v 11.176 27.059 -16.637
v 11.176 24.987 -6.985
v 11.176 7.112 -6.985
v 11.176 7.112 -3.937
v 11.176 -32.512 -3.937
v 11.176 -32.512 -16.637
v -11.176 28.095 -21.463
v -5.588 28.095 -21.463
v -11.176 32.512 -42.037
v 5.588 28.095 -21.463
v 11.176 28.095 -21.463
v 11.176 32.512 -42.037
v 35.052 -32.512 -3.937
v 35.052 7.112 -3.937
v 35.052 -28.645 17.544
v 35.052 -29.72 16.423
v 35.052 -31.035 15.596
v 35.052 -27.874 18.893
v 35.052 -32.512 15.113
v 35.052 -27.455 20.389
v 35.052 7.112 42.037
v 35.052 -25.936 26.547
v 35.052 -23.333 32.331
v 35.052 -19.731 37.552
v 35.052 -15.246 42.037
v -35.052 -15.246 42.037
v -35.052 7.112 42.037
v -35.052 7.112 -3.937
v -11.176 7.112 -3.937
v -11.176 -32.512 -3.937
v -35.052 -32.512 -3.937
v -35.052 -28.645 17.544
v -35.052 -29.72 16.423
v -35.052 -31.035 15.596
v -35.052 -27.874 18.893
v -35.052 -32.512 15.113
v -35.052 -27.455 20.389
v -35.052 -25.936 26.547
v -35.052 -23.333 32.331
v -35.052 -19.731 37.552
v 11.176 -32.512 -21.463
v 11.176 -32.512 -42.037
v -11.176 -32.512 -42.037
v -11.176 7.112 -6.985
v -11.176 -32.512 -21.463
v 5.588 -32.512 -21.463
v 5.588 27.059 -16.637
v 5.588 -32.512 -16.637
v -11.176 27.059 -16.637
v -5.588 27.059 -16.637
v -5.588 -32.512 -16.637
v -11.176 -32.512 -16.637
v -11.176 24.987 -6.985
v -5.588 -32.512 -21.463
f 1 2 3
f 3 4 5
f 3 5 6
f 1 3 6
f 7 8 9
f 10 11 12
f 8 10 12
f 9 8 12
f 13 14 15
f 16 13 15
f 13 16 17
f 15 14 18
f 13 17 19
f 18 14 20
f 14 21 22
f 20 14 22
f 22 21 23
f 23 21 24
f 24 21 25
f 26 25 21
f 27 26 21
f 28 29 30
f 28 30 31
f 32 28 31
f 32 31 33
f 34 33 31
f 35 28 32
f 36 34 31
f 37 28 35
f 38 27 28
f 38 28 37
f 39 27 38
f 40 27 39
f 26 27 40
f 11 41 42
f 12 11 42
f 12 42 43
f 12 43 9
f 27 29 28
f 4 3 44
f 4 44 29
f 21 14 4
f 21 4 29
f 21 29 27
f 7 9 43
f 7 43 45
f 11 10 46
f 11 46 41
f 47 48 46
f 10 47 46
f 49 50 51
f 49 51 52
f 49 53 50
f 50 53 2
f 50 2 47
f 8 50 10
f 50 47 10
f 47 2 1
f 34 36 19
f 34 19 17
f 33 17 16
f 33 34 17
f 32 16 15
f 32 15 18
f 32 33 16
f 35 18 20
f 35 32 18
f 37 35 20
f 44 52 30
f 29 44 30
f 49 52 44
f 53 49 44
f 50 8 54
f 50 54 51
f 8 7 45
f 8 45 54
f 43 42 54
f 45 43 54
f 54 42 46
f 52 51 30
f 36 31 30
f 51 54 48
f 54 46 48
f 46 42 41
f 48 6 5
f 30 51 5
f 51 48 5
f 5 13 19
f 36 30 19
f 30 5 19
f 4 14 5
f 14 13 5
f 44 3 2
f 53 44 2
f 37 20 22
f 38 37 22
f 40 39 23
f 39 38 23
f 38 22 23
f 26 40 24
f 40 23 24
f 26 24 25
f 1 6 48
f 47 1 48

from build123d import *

# Parameters (mm, degrees)
F0_W          = 65.024
F0_H          = 84.074
F1_DEPTH      = 35.052
F1_DEPTH_BACK = 35.052
F3_DEPTH      = 63.5
F4_W          = 77.3881527235
F4_H          = 70.5238262352
F5_DEPTH      = 38.1
F7_DEPTH      = 25.4
F9_DEPTH      = 38.1
F10_T1_DEPTH  = 70.104


# Not quite as in the source:
# - a fillet or chamfer that OpenCascade refuses, or shapes differently, is made with other operations: its cross-section is extruded or revolved along the edge and cut away or added


with BuildPart() as f1:
    # F0 (on Right) → F1 (new body, two sides)
    with BuildSketch(Plane.YZ) as f1_sk:
        Rectangle(F0_W, F0_H)
    extrude(amount=F1_DEPTH)
    extrude(f1_sk.sketch, amount=-F1_DEPTH_BACK)

    # F2 (on Front) → F3 (cut, symmetric)
    with BuildSketch(Plane.XZ):
        Polygon((-11.176, -16.637), (-11.176, -3.937), (-78.232, -3.937), (-78.232, -87.8102174824), (-11.176, -87.8102174824), (-11.176, -21.463), (-5.588, -21.463), (-5.588, -16.637), align=None)
        Polygon((75.6774835046, -3.937), (11.176, -3.937), (11.176, -16.637), (5.588, -16.637), (5.588, -21.463), (11.176, -21.463), (11.176, -87.8102174824), (75.6774835046, -87.8102174824), align=None)
    extrude(amount=F3_DEPTH, both=True, mode=Mode.SUBTRACT)

    # F4 (on Right) → F5 (cut, symmetric)
    with BuildSketch(Plane.YZ):
        with Locations((45.8060763618, 28.2769131176)):
            Rectangle(F4_W, F4_H)
    extrude(amount=F5_DEPTH, both=True, mode=Mode.SUBTRACT)

    # F6 (on face) → F7 (cut, symmetric)
    with BuildSketch(Plane.YZ.offset(11.176)):
        Polygon((32.512, -21.463), (32.512, -42.037), (58.1510797716, -47.1596371092), (55.1210400309, 2.9251785083), (22.86, 2.9251785083), (28.0953935412, -21.463), align=None)
        Polygon((28.0953935412, -21.463), (32.512, -42.037), (32.512, -21.463), align=None)
    extrude(amount=F7_DEPTH, both=True, mode=Mode.SUBTRACT)

    # F8 (on Right) → F9 (cut, symmetric)
    with BuildSketch(Plane.YZ):
        with BuildLine():
            ThreePointArc((-27.8538692881, 15.113), (-17.5873761822, 39.8985068942), (7.1981307119, 50.165))
            Line((7.1981307119, 50.165), (-30.8227688074, 66.0536216443))
            Line((-30.8227688074, 66.0536216443), (-47.4338419735, 15.113))
            Line((-47.4338419735, 15.113), (-27.8538692881, 15.113))
        make_face()
    extrude(amount=F9_DEPTH, both=True, mode=Mode.SUBTRACT)

    # F10: fillet of radius 6.35 on 1 edges, made by hand

    # F10_s2 → F10_t1 (join)
    with BuildSketch(Plane.YZ.offset(-35.052)):
        with BuildLine():
            ThreePointArc((-32.512, 15.113), (-29.1481831988, 16.9504285484), (-27.454542127, 20.3888856242))
            ThreePointArc((-27.454542127, 20.3888856242), (-27.7538949257, 17.7584882017), (-27.8538692881, 15.113))
            Line((-27.8538692881, 15.113), (-32.512, 15.113))
        make_face()
    extrude(amount=F10_T1_DEPTH)


solid = f1.part
